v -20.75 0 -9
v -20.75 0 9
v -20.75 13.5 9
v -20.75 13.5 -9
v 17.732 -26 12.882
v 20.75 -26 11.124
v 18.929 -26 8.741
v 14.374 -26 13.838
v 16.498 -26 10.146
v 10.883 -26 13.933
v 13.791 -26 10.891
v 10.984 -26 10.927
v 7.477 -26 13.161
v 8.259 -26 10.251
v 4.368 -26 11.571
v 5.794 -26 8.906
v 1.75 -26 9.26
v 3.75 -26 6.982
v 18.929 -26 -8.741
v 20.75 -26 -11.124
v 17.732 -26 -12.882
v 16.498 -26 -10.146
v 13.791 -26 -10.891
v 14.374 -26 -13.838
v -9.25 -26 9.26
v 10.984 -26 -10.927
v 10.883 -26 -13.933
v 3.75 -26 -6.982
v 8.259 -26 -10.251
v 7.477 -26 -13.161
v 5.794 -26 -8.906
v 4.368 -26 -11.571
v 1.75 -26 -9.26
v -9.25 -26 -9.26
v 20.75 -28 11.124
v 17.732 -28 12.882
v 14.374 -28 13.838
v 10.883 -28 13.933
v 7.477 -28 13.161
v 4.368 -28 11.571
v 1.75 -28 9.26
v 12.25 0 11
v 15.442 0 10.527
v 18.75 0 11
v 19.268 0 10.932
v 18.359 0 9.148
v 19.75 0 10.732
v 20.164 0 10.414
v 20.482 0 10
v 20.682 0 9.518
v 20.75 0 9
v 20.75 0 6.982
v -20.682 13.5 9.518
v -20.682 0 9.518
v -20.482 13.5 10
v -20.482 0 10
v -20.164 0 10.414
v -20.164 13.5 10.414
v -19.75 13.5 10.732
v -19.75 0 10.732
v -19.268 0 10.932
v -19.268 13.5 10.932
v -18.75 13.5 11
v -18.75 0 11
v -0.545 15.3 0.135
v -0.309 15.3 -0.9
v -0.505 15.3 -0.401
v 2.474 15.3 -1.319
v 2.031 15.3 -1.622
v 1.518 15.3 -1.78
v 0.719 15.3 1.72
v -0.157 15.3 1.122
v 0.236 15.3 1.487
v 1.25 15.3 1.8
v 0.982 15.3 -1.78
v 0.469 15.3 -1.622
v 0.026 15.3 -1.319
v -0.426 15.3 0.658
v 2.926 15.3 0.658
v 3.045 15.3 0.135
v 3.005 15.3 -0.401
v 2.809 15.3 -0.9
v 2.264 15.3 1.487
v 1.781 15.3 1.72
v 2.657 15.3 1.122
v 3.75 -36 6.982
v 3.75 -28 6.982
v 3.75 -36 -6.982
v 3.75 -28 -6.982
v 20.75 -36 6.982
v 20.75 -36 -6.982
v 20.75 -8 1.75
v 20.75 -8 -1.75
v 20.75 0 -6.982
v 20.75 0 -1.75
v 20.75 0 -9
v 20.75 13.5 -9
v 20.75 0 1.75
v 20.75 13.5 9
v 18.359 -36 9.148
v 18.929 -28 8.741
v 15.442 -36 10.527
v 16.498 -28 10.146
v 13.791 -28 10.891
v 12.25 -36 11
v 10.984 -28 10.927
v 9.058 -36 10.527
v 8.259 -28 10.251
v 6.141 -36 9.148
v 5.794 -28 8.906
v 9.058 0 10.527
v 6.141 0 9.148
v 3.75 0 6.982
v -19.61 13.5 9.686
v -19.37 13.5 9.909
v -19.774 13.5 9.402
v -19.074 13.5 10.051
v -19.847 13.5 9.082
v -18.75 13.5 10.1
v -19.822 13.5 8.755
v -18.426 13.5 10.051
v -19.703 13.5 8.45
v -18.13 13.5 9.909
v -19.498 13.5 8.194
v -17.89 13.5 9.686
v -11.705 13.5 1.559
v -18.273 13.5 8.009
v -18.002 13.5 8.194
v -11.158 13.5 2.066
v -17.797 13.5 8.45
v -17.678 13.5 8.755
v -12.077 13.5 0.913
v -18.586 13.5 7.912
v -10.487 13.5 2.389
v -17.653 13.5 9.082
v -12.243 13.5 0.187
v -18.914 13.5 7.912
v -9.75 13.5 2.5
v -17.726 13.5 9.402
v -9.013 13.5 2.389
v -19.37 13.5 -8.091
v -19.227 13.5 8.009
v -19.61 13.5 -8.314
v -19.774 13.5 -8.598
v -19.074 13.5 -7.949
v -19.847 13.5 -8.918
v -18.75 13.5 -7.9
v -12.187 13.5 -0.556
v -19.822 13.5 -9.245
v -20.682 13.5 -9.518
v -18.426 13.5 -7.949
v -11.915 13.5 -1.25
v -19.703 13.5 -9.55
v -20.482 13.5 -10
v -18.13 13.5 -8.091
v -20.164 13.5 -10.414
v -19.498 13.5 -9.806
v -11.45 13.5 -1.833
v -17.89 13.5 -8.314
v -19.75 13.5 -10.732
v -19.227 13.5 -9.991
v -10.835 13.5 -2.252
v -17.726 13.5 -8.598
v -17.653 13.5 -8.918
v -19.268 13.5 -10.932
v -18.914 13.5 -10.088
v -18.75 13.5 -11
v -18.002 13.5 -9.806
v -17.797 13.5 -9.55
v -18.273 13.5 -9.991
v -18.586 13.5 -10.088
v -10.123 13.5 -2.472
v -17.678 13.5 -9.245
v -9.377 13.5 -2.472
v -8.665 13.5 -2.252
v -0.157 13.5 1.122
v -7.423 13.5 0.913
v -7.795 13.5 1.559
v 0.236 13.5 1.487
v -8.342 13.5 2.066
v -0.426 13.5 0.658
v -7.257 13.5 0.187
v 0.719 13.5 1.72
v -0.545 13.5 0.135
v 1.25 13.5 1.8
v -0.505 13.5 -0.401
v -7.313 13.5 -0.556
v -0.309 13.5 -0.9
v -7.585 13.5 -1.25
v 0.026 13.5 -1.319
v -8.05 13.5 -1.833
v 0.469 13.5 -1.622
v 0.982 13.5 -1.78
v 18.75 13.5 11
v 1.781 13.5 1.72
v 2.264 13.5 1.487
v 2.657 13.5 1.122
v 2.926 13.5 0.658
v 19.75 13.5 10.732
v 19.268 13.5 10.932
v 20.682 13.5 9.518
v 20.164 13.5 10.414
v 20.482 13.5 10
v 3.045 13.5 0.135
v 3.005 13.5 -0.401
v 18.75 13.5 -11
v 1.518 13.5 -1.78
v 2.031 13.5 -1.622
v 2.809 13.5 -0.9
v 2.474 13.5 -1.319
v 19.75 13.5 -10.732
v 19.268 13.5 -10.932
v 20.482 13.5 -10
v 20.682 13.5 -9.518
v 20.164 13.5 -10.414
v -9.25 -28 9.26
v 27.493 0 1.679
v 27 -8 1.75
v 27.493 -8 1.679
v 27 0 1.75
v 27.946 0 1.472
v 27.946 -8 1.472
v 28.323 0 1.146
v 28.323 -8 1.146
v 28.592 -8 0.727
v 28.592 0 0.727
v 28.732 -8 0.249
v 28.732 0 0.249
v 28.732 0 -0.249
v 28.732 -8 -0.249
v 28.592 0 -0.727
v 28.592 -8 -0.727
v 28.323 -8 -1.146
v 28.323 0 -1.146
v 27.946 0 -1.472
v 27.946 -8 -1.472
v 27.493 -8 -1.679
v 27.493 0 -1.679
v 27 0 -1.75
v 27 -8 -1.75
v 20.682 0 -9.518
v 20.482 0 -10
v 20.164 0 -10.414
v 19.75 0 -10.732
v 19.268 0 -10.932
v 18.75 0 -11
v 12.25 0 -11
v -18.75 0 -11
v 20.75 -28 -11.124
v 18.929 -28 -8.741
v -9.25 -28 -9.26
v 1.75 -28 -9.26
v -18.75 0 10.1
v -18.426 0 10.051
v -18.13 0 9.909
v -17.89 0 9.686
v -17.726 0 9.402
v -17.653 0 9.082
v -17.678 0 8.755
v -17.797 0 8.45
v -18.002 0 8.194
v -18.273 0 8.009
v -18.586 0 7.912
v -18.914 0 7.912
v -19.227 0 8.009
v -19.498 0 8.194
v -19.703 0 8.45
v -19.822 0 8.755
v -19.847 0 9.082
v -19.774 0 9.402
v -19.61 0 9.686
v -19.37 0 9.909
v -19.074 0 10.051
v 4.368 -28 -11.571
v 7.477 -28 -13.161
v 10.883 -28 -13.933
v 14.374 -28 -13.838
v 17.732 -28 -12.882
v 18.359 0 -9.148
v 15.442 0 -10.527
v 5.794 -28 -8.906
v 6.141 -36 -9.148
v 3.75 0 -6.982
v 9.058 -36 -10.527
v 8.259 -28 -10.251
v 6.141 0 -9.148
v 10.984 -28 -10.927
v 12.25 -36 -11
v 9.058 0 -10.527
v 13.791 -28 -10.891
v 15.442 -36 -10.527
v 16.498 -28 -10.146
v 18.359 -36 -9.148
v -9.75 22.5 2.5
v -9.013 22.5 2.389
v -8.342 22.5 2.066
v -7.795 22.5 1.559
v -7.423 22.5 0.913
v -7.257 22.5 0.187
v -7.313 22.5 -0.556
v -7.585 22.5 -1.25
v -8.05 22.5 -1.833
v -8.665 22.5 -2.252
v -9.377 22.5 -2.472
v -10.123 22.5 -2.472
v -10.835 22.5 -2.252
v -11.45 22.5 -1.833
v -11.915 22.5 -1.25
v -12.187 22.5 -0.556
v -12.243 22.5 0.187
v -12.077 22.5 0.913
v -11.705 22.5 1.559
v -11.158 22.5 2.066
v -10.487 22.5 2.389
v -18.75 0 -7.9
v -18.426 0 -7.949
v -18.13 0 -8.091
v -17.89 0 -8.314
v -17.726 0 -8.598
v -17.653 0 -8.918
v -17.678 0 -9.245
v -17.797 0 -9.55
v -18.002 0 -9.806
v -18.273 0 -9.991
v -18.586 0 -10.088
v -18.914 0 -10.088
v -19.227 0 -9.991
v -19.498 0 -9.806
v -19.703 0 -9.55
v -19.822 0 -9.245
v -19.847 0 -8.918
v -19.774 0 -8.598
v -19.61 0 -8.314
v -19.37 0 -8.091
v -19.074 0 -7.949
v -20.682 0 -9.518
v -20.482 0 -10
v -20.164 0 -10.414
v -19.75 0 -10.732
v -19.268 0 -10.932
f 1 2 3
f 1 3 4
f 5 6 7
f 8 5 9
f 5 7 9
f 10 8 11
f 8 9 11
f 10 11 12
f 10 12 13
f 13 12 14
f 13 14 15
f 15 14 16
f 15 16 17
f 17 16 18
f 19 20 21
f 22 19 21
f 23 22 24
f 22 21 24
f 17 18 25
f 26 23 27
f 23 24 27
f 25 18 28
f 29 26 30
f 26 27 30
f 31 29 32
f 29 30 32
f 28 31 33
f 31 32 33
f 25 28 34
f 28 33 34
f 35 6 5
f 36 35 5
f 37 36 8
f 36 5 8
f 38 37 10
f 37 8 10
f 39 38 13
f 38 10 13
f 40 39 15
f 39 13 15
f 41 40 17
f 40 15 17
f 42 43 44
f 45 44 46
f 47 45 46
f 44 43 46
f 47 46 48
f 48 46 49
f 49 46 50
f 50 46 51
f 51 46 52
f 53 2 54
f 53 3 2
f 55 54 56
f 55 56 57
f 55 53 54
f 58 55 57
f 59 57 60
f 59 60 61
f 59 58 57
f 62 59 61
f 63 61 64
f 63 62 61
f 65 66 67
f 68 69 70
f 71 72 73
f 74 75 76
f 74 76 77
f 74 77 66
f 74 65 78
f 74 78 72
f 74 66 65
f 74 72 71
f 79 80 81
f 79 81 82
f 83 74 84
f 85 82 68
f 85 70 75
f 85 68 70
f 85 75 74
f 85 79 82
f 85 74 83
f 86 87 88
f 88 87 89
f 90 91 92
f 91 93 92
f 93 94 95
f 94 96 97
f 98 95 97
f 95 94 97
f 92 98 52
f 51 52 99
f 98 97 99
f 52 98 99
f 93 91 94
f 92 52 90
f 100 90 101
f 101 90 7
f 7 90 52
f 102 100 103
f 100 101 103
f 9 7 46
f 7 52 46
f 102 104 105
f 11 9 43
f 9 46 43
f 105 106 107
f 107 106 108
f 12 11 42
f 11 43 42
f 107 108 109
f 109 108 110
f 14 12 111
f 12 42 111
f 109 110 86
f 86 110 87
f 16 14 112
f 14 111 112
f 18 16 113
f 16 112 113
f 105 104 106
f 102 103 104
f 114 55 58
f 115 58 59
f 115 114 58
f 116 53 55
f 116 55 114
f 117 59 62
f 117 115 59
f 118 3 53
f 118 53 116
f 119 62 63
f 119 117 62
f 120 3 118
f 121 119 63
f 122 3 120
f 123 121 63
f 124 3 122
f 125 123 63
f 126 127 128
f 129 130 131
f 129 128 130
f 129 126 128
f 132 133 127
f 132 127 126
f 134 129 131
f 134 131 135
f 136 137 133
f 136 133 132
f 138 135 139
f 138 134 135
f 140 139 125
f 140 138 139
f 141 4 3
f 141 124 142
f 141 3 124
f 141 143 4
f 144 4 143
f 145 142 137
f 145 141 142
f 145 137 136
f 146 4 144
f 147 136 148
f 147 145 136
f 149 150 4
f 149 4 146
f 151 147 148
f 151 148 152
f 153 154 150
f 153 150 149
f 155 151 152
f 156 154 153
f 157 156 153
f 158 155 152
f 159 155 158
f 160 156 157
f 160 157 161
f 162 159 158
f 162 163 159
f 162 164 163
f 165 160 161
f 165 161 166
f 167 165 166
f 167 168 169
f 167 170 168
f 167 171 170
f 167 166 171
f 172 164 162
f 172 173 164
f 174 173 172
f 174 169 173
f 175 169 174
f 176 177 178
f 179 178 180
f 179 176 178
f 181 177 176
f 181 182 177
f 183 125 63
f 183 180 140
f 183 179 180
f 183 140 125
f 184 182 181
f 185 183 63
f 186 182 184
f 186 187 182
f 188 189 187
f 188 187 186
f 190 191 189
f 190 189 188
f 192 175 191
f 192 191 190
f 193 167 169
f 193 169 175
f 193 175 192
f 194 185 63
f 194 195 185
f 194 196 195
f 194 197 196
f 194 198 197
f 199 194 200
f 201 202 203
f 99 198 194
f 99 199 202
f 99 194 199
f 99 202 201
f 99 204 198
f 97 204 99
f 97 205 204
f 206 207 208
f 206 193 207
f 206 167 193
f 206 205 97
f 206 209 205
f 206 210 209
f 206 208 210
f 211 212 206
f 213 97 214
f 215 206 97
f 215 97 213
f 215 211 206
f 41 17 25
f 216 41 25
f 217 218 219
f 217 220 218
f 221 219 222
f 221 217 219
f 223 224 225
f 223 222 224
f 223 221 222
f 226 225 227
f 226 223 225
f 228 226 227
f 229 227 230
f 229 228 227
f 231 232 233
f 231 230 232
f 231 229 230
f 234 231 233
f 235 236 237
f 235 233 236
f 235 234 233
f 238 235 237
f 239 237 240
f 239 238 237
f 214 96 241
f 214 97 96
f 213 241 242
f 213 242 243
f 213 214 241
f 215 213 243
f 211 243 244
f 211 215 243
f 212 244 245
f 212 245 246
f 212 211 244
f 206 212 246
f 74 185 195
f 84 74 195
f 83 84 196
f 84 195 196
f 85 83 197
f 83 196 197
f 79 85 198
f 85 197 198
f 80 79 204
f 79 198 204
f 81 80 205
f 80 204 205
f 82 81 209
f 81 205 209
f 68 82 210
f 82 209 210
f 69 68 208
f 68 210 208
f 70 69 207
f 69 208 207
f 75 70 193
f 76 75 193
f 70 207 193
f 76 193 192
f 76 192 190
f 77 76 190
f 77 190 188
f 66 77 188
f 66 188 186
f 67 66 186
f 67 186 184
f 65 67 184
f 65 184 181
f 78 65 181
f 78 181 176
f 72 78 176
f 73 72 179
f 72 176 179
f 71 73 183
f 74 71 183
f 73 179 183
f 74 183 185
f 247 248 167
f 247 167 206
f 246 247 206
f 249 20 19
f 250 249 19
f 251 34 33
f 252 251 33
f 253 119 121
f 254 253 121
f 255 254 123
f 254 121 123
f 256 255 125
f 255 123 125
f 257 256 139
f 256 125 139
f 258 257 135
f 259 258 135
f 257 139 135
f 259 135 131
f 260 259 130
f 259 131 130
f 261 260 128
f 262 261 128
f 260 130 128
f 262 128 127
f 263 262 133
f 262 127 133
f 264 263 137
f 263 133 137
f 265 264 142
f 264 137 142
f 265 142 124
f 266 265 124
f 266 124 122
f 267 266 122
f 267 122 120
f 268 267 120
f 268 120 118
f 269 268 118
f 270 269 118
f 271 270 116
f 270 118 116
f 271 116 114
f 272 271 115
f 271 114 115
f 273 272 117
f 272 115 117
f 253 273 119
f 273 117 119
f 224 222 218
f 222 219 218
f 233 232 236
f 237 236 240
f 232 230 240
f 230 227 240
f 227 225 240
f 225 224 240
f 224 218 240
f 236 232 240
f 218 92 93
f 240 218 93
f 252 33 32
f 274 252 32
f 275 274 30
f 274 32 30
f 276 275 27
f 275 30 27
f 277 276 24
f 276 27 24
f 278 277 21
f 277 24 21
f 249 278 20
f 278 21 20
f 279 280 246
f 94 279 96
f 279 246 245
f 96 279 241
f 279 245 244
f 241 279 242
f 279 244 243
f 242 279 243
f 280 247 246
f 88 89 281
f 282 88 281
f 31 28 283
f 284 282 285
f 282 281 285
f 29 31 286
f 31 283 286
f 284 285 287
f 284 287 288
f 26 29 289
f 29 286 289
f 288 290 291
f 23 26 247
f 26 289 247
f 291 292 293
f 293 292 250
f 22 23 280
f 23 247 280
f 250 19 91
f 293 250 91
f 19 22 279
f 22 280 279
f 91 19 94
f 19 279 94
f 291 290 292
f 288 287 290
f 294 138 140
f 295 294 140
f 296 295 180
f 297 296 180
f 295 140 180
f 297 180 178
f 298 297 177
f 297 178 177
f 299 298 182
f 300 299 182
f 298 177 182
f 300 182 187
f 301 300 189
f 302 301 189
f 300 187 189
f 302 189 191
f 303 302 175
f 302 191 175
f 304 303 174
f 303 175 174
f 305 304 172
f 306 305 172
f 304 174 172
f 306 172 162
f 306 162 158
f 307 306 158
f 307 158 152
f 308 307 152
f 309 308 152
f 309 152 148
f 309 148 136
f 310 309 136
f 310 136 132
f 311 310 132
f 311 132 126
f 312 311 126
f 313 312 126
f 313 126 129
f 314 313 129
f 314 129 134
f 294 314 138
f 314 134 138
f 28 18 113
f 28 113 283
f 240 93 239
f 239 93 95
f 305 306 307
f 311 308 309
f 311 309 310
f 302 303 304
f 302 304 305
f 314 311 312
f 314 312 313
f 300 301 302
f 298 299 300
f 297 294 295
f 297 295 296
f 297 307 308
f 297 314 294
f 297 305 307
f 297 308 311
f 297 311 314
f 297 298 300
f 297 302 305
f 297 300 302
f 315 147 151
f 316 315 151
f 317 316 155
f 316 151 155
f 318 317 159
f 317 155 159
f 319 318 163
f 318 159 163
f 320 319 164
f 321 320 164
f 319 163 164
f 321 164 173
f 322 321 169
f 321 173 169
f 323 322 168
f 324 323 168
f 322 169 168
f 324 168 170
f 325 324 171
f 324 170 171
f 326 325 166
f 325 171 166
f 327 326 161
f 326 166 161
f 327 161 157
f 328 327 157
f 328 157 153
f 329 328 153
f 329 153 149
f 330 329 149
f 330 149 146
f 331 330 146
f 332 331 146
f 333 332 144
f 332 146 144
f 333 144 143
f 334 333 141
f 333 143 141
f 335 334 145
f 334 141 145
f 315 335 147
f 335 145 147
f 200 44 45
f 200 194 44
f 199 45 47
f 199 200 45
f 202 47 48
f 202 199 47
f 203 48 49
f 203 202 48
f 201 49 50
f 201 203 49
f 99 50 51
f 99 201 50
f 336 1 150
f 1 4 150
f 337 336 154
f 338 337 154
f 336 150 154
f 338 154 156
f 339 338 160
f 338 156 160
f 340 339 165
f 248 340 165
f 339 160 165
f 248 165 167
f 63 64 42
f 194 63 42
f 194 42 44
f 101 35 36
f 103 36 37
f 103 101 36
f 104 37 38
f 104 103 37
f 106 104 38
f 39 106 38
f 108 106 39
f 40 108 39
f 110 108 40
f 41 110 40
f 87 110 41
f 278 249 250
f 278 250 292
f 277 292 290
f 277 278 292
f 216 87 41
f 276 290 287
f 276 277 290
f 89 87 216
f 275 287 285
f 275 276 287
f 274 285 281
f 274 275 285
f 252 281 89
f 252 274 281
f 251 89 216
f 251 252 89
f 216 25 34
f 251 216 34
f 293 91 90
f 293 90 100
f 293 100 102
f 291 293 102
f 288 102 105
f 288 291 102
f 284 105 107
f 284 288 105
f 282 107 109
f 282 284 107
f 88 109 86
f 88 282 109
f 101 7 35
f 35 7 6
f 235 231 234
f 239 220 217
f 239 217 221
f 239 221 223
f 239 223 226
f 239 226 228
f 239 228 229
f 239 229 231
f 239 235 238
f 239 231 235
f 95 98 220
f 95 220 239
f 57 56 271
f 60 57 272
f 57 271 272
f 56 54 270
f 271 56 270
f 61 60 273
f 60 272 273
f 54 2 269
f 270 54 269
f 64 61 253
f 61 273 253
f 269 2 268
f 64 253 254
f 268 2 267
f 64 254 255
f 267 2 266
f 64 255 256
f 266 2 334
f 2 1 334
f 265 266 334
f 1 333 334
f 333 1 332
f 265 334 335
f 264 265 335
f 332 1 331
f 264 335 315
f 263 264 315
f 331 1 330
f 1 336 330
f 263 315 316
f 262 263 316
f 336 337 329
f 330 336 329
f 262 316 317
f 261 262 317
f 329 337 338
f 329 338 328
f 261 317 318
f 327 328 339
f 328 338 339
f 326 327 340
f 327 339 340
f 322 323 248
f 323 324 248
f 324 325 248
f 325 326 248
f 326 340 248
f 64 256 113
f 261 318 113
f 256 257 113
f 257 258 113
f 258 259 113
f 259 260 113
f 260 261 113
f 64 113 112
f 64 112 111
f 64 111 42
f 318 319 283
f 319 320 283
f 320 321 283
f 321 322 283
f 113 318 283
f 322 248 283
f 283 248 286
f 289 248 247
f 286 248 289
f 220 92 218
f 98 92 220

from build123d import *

# Parameters (mm, degrees)
SKETCH1_W           = 41.5
SKETCH1_H           = 22
BASE_DEPTH          = 13.5
FILLET1_R           = 2
SKETCH2_R           = 1.1
SCREWHOLE_DEPTH     = 13.5
SKETCH3_R           = 2.5
SPINAXEL_DEPTH      = 9
SKETCH4_R           = 1.8
FITTINGKNOB_DEPTH   = 1.8
BOSS_EXTRUDE4_DEPTH = 36
EXTRUDE_THIN1_DEPTH = 2
SKETCH7_W           = 3.5
SKETCH7_H           = 8
BOSS_EXTRUDE5_DEPTH = 8
FILLET2_RADIUS      = 1.75
FILLET2_LENGTH      = 8


# Read off the part's stored shape, not the designer's step: Extrude-Thin1
with BuildPart() as part:
    # Sketch1 → Base (new body)
    with BuildSketch(Plane(origin=(0, 0, 0), x_dir=(1, 0, 0), z_dir=(0, 1, 0))):
        Rectangle(SKETCH1_W, SKETCH1_H)
    extrude(amount=BASE_DEPTH)

    # Fillet1
    fillet1_edges = [part.edges().sort_by_distance(p)[0] for p in [
        (20.75, 6.75, 11),
        (-20.75, 6.75, 11),
        (-20.75, 6.75, -11),
        (20.75, 6.75, -11),
    ]]
    fillet(fillet1_edges, radius=FILLET1_R)

    # Sketch2 → ScrewHole (cut)
    with BuildSketch(Plane(origin=(0, 13.5, 0), x_dir=(1, 0, 0), z_dir=(0, 1, 0))):
        with Locations(Location((-18.75, 9, 0), (0, 0, 270))):
            Circle(SKETCH2_R)
        with Locations(Location((-18.75, -9, 0), (0, 0, 270))):
            Circle(SKETCH2_R)
    extrude(amount=-SCREWHOLE_DEPTH, mode=Mode.SUBTRACT)

    # Sketch3 → SpinAxel (add)
    with BuildSketch(Plane(origin=(0, 13.5, 0), x_dir=(1, 0, 0), z_dir=(0, 1, 0))):
        with Locations(Location((-9.75, 0, 0), (0, 0, 270))):
            Circle(SKETCH3_R)
    extrude(amount=SPINAXEL_DEPTH)

    # Sketch4 → FittingKnob (add)
    with BuildSketch(Plane(origin=(0, 13.5, 0), x_dir=(1, 0, 0), z_dir=(0, 1, 0))):
        with Locations(Location((1.25, 0, 0), (0, 0, 270))):
            Circle(SKETCH4_R)
    extrude(amount=FITTINGKNOB_DEPTH)

    # Sketch5 → Boss-Extrude4 (add)
    with BuildSketch(Plane(origin=(0, 0, 0), x_dir=(-1, 0, 0), z_dir=(0, -1, 0))):
        with BuildLine():
            Line((-3.75, -6.982120022), (-3.75, 6.982120022))
            ThreePointArc((-3.75, 6.982120022), (-12.25, 11), (-20.75, 6.982120022))
            Line((-20.75, 6.982120022), (-20.75, -6.982120022))
            ThreePointArc((-20.75, -6.982120022), (-12.25, -11), (-3.75, -6.982120022))
        make_face()
    extrude(amount=BOSS_EXTRUDE4_DEPTH)

    # Extrude-Thin1 outline → Extrude-Thin1 (add)
    with BuildSketch(Plane(origin=(0, -26, 0), x_dir=(-1, 0, 0), z_dir=(0, -1, 0))):
        with BuildLine():
            ThreePointArc((-3.75, -6.982120022), (-10.984143444, -10.926921212), (-18.928571429, -8.740519646))
            Line((-18.928571429, -8.740519646), (-20.75, -11.124297731))
            ThreePointArc((-20.75, -11.124297731), (-10.882966454, -13.933097979), (-1.75, -9.260129589))
            Line((-1.75, -9.260129589), (9.25, -9.260129589))
            Line((9.25, -9.260129589), (9.25, 9.260129589))
            Line((9.25, 9.260129589), (-1.75, 9.260129589))
            ThreePointArc((-1.75, 9.260129589), (-10.882966454, 13.933097979), (-20.75, 11.124297731))
            Line((-20.75, 11.124297731), (-18.928571429, 8.740519646))
            ThreePointArc((-18.928571429, 8.740519646), (-10.984143444, 10.926921212), (-3.75, 6.982120022))
            Line((-3.75, 6.982120022), (-3.75, -6.982120022))
        make_face()
    extrude(amount=EXTRUDE_THIN1_DEPTH)

    # Sketch7 → Boss-Extrude5 (add)
    with BuildSketch(Plane(origin=(20.75, 0, 0), x_dir=(0, 0, -1), z_dir=(1, 0, 0))):
        with Locations((0, -4)):
            Rectangle(SKETCH7_W, SKETCH7_H)
    extrude(amount=BOSS_EXTRUDE5_DEPTH)

    # Fillet2: full round fillet: the end face becomes a half cylinder, R = half its width
    fillet2_face = Plane((28.75, -4, 0), x_dir=(0, 1, 0), z_dir=(1, 0, 0))  # on the end face: x along it, z out of the body
    fillet2_slab = fillet2_face.offset(-FILLET2_RADIUS / 2) * Box(FILLET2_LENGTH, 2 * FILLET2_RADIUS, FILLET2_RADIUS, mode=Mode.PRIVATE)  # the body's end, R deep
    fillet2_round = Plane((27, -4, 0), x_dir=(1, 0, 0), z_dir=(0, 1, 0)) * Cylinder(FILLET2_RADIUS, FILLET2_LENGTH, mode=Mode.PRIVATE)  # its axis R under the face
    add(fillet2_slab - fillet2_round, mode=Mode.SUBTRACT)


solid = part.part
